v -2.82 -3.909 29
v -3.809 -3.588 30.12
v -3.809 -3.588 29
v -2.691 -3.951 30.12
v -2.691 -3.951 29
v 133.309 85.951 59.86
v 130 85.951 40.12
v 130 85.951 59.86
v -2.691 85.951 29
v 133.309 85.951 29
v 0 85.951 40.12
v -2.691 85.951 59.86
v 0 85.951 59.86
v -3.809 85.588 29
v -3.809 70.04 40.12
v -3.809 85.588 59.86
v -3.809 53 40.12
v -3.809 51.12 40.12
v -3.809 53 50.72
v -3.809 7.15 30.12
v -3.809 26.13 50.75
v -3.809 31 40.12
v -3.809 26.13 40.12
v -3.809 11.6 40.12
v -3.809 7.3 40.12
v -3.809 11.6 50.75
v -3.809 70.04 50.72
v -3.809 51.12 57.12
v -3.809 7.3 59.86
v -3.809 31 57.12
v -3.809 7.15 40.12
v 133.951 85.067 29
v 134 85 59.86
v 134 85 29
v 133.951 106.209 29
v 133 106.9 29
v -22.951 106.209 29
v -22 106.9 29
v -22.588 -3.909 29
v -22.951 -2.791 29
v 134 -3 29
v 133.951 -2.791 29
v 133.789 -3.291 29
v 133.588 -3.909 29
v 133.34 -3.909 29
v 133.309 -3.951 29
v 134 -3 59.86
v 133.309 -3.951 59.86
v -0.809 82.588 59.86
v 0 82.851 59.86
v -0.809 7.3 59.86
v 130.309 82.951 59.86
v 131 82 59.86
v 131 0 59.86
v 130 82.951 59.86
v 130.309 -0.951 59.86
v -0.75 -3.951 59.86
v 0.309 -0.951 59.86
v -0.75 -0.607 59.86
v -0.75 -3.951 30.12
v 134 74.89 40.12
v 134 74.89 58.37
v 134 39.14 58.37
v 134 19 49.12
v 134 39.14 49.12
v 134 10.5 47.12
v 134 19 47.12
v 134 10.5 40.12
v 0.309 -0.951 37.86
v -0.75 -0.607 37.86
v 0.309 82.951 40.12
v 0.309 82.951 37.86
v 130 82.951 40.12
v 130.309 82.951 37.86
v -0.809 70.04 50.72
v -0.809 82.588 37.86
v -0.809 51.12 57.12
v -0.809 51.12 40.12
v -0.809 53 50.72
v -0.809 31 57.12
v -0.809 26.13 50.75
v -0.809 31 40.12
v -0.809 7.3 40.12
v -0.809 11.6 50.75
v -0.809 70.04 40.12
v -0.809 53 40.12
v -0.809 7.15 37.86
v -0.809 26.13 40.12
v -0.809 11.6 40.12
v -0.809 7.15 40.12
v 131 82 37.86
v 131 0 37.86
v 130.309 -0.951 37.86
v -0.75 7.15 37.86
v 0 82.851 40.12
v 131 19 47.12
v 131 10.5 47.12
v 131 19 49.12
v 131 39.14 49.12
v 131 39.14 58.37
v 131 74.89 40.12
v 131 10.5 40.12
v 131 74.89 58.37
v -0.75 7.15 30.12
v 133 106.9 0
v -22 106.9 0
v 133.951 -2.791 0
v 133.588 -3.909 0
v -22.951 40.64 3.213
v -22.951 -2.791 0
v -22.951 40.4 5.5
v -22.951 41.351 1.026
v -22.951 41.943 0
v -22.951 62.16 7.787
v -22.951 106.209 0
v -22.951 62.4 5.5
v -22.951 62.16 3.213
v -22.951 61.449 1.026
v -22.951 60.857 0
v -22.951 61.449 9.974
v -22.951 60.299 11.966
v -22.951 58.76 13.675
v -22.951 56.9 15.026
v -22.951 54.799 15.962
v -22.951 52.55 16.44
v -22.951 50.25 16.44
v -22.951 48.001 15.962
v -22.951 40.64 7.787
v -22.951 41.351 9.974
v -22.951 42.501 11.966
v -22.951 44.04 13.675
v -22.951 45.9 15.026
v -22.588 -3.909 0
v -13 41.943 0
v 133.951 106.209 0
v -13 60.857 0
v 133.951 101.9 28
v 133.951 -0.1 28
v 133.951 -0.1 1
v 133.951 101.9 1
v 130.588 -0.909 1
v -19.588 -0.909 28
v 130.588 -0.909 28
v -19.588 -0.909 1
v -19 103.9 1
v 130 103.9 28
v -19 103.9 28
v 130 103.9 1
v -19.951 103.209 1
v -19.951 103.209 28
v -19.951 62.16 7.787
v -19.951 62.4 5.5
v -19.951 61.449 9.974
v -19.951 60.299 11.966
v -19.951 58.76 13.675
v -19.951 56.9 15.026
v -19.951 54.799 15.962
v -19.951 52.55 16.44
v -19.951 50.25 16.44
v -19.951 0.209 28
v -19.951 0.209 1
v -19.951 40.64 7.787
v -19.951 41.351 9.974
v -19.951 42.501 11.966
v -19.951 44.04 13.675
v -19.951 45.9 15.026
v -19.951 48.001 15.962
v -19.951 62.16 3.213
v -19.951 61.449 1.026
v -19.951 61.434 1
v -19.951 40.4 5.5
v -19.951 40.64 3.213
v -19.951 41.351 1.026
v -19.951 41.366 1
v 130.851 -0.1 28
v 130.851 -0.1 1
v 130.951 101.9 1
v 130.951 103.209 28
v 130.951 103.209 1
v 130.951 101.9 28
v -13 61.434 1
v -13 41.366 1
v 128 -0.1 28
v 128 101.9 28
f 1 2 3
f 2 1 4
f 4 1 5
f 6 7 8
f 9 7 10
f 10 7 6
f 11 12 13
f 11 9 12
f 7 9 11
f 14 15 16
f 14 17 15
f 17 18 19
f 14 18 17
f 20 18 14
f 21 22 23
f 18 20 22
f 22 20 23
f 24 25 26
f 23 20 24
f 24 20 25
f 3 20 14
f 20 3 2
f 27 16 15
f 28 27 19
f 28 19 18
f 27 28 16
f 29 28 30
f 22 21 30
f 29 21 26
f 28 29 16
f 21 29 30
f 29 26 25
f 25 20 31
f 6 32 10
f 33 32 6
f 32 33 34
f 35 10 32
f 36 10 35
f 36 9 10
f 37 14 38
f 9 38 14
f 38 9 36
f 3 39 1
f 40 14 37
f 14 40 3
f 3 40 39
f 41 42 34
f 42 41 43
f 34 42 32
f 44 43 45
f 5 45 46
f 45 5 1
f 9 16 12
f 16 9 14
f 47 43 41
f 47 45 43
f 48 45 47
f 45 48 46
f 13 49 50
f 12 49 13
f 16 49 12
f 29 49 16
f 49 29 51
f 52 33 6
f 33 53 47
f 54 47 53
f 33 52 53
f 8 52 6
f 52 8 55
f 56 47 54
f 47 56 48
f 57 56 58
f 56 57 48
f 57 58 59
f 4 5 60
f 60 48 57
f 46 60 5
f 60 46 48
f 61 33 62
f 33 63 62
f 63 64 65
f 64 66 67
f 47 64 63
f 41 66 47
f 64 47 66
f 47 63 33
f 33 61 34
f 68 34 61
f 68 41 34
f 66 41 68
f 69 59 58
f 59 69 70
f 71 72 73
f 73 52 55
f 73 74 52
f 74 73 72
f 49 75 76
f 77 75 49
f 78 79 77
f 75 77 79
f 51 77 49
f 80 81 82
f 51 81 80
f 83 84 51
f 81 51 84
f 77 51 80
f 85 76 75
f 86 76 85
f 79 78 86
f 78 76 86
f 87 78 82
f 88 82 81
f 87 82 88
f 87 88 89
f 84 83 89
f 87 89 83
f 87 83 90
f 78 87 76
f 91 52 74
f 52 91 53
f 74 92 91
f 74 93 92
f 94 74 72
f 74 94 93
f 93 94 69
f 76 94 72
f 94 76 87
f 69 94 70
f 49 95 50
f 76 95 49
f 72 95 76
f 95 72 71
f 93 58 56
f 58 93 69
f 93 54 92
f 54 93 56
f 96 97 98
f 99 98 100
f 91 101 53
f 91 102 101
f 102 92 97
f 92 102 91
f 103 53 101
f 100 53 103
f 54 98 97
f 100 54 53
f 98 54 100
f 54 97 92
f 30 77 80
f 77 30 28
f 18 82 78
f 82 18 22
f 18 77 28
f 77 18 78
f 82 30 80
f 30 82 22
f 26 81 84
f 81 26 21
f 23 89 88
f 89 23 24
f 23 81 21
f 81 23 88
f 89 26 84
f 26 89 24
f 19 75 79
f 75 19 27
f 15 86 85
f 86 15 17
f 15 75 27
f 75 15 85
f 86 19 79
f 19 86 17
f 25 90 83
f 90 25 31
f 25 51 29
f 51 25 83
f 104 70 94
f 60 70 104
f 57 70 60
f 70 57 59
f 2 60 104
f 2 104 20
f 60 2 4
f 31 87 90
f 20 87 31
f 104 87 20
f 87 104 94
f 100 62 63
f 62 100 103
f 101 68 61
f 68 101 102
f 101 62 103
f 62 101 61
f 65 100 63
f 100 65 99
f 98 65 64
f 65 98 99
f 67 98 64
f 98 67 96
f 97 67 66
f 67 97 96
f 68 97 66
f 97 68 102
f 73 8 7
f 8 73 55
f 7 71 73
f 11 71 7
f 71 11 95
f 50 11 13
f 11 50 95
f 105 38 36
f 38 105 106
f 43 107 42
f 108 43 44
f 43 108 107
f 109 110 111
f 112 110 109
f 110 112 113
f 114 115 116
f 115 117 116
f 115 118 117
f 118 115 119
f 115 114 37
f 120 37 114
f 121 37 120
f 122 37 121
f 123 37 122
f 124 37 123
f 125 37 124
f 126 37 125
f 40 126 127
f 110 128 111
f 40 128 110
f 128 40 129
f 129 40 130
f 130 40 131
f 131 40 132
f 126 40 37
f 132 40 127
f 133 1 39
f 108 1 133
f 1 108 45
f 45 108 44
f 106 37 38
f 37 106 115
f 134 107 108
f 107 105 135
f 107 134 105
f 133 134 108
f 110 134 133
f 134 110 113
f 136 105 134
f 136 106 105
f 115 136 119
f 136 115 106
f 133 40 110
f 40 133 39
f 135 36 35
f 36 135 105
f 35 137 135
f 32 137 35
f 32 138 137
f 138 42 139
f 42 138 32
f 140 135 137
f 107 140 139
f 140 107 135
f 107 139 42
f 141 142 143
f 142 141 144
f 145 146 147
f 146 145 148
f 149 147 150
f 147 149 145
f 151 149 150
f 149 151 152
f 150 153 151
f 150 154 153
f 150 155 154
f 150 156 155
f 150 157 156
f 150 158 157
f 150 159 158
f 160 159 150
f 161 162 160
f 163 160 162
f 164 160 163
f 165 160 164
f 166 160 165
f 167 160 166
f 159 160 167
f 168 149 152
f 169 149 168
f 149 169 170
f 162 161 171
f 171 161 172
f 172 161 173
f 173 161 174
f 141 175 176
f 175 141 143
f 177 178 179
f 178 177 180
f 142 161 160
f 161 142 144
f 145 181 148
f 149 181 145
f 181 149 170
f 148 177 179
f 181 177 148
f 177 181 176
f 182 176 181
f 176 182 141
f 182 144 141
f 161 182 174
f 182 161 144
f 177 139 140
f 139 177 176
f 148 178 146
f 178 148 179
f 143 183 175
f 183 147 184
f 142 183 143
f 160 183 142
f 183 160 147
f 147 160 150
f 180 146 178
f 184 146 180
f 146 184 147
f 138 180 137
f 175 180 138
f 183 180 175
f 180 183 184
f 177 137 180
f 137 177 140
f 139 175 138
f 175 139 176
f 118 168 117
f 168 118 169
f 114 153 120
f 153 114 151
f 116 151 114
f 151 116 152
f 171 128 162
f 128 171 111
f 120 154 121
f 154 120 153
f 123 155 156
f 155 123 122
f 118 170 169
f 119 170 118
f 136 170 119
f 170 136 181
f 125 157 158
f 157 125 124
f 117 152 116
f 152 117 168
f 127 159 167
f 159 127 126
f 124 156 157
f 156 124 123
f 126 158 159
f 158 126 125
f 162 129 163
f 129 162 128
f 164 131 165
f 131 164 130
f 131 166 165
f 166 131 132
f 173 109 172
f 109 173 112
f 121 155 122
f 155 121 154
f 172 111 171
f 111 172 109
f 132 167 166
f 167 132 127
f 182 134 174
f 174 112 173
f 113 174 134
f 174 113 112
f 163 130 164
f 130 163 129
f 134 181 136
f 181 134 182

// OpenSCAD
// file: ../hdd_case/case.scad
module case (width, length, wall_height, wall_thickness, x_offset, y_offset, z_offset){
    //Negative space
    top_right_point = [width + x_offset, length + y_offset, z_offset];
    top_left_point = [width + x_offset, y_offset, z_offset];
    bottom_right_point = [x_offset, length + y_offset, z_offset];
    bottom_left_point = [x_offset, y_offset, z_offset];

    //Base space
    top_right_point_base = [width + wall_thickness, length + wall_thickness, 0];
    top_left_point_base = [width + wall_thickness, -wall_thickness, 0];
    bottom_right_point_base = [-wall_thickness, length + wall_thickness, 0];
    bottom_left_point_base = [-wall_thickness, -wall_thickness, 0];
    
    //Lists for the for loops
    base_points = [top_right_point_base, top_left_point_base, bottom_right_point_base, bottom_left_point_base];
    points = [top_right_point, top_left_point, bottom_right_point, bottom_left_point];

    difference(){
        hull(){
            for (point = base_points){
                translate(point){
                    cylinder(height);
                }
            }
        }
        hull(){
            for (point = points){
                translate(point){
                    cylinder(height);
                }
            }
        }
    }
}

module roofed_case(width, length, wall_height, wall_thickness, x_offset, y_offset, z_offset, roof_thickness){
    case(width, length, wall_height, wall_thickness, x_offset, y_offset, z_offset);
    top_right_point_base = [width + wall_thickness, length + wall_thickness, wall_height];
    top_left_point_base = [width + wall_thickness, -wall_thickness, wall_height ];
    bottom_right_point_base = [-wall_thickness, length + wall_thickness, wall_height];
    bottom_left_point_base = [-wall_thickness, -wall_thickness, wall_height];
    points = [top_right_point_base, top_left_point_base, bottom_right_point_base, bottom_left_point_base];
    hull(){
           for(point = points){
               translate(point) cylinder(roof_thickness);
           }
    }
    
}

//Changeable values
width = 100;
length = 100;
wall_height = 10;
x_offset = 0;
y_offset = 0;
z_offset = 1;
wall_thickness = 3;
roof_thickness = 3;

//Non-changeable values
height = z_offset + wall_height;

//This is for making sure it renders correctly
/*
translate([0, 0, wall_height + 10]){
    case(width,
        length,
        wall_height,
        wall_thickness,
        x_offset,
        y_offset,
        z_offset);
}

roofed_case(width,
     length,
     wall_height,
     wall_thickness,
     x_offset,
     y_offset,
     z_offset);
*/
// file: case.scad
module case (width, length, wall_height, wall_thickness, x_offset, y_offset, z_offset){
    //Negative space
    top_right_point = [width + x_offset, length + y_offset, z_offset];
    top_left_point = [width + x_offset, y_offset, z_offset];
    bottom_right_point = [x_offset, length + y_offset, z_offset];
    bottom_left_point = [x_offset, y_offset, z_offset];

    //Base space
    top_right_point_base = [width + wall_thickness, length + wall_thickness, 0];
    top_left_point_base = [width + wall_thickness, -wall_thickness, 0];
    bottom_right_point_base = [-wall_thickness, length + wall_thickness, 0];
    bottom_left_point_base = [-wall_thickness, -wall_thickness, 0];
    
    //Lists for the for loops
    base_points = [top_right_point_base, top_left_point_base, bottom_right_point_base, bottom_left_point_base];
    points = [top_right_point, top_left_point, bottom_right_point, bottom_left_point];

    difference(){
        hull(){
            for (point = base_points){
                translate(point){
                    cylinder(height);
                }
            }
        }
        hull(){
            for (point = points){
                translate(point){
                    cylinder(height);
                }
            }
        }
    }
}

module roofed_case(width, length, wall_height, wall_thickness, x_offset, y_offset, z_offset, roof_thickness){
    case(width, length, wall_height, wall_thickness, x_offset, y_offset, z_offset);
    top_right_point_base = [width + wall_thickness, length + wall_thickness, wall_height];
    top_left_point_base = [width + wall_thickness, -wall_thickness, wall_height ];
    bottom_right_point_base = [-wall_thickness, length + wall_thickness, wall_height];
    bottom_left_point_base = [-wall_thickness, -wall_thickness, wall_height];
    points = [top_right_point_base, top_left_point_base, bottom_right_point_base, bottom_left_point_base];
    hull(){
           for(point = points){
               translate(point) cylinder(roof_thickness);
           }
    }
    
}

//Changeable values
width = 100;
length = 100;
wall_height = 10;
x_offset = 0;
y_offset = 0;
z_offset = 1;
wall_thickness = 3;
roof_thickness = 3;

//Non-changeable values
height = z_offset + wall_height;

//This is for making sure it renders correctly
/*
translate([0, 0, wall_height + 10]){
    case(width,
        length,
        wall_height,
        wall_thickness,
        x_offset,
        y_offset,
        z_offset);
}

roofed_case(width,
     length,
     wall_height,
     wall_thickness,
     x_offset,
     y_offset,
     z_offset);
*/
// file: ../hdd_case/3.5in_case.scad
include<case.scad>

//Changeable values
width = 103;
length = 149;
wall_height = 28;
x_offset = 0;
y_offset = 0;
z_offset = 1;
wall_thickness = 3;
roof_thickness = 2;

//Opening
disk_x = 102;
disk_y = wall_thickness + 3;
disk_z = 27;
position_disk_x = 0;
position_disk_y = -4;
position_disk_z = z_offset;

//Manual eject
heigh_eject = 10;
radius_1_eject = 22/2;
radius_2_eject = 22/2;
position_eject_x = width/2;
position_eject_y = 153;
position_eject_z = radius_1_eject/2;
rotate_eject_x = 90;
rotate_eject_y = 0;
rotate_eject_z = -0;

//Non-changeable values
height = z_offset + wall_height;

module make_35_holder(){
	difference(){
		roofed_case(width,
		     length,
		     wall_height,
		     wall_thickness,
		     x_offset,
		     y_offset,
		     z_offset);
		translate([position_disk_x, position_disk_y, position_disk_z]) {
		    color([0, 1, 0]) cube([disk_x, disk_y, disk_z]);
		}
		translate([position_eject_x, position_eject_y, position_eject_z]){
		    rotate([rotate_eject_x, rotate_eject_y, rotate_eject_z]){
			    color([0, 1, 0]) cylinder(heigh_eject, radius_1_eject, radius_2_eject);
		    }
		}
	}
}
make_35_holder();
// file: case_with_port_holes.scad
//Editiable values
include<case.scad>

//Case values
width = 130;
length = 82;
wall_height = 22;
x_offset = 0;
y_offset = 0;
z_offset = 8.86;
wall_thickness = 3;


//Offset_value
backside_x_offset = -4;
frontside_x_offset = width;
port_z_offset = z_offset + 2.26;
port_y_offset = length;

//Ethernet
ethernet_x = 20.12;
ethernet_y = 21.22;
ethernet_z = 17;
ethernet_position_x = backside_x_offset;
ethernet_position_y = 31;
ethernet_position_z = port_z_offset;

//Power
power_cable_x = 11.58;
power_cable_y = 14.53;
power_cable_z = 10.63;
power_cable_position_x = backside_x_offset;
power_cable_position_y = 11.6;
power_cable_position_z = port_z_offset;

//HDMI
hdmi_x = 11.43;
hdmi_y = 17.04;
hdmi_z = 10.6;
hdmi_position_x = backside_x_offset;
hdmi_position_y = 53;
hdmi_position_z = port_z_offset;

//SATA Main Card
sata_x = 67.5;
sata_y = 7.3;
sata_z = 58.18;
sata_position_x = backside_x_offset;
sata_position_y = 0;
sata_position_z = port_z_offset;


//Face SATA card
sata_face_x = 3.25;
sata_face_y = 15.15;
sata_face_z = 80;
sata_face_position_x = backside_x_offset;
sata_face_position_y = -8;
sata_face_position_z = port_z_offset -10;

//USB1
usb1_x = 10;
usb1_y = 18.25;
usb1_z = 18.25;
usb1_position_x = frontside_x_offset;
usb1_position_y = 56.64;
usb1_position_z = port_z_offset;

//USB2
usb2_x = 10;
usb2_y = 18.25;
usb2_z = 18.25;
usb2_position_x = frontside_x_offset;
usb2_position_y = 39.14;
usb2_position_z = port_z_offset;

//Power buttom
power_button_x = 10;
power_button_y = 16.25;
power_button_z = 9;
power_button_position_x = frontside_x_offset;
power_button_position_y = 19;
power_button_position_z = port_z_offset;

//Reset button
reset_button_x = 10;
reset_button_y = 16.25;
reset_button_z = 9;
reset_button_position_x = frontside_x_offset;
reset_button_position_y = 29;
reset_button_position_z = port_z_offset;

//Audio
audio_x = 10;
audio_y = 13;
audio_z = 7;
audio_position_x = frontside_x_offset;
audio_position_y = 10.5;
audio_position_z = port_z_offset;

//Side load
side_x = 130;
side_y = 10;
side_z = 20;
side_position_x = 0;
side_position_y = port_y_offset;
side_position_z = port_z_offset;

//The box
module make_case(){
	difference(){
		case(width,
		     length,
		     wall_height,
		     wall_thickness,
		     x_offset,
		     y_offset,
		     z_offset);
		/*translate([-4, -10, 0]){
			color([1, 0, 0]) cube([135, 100, 10]);
		}*/
		translate([ethernet_position_x, ethernet_position_y, ethernet_position_z]){
			color([0, 1, 0]) cube([ethernet_x, ethernet_x, ethernet_z]);
		}
		translate([power_cable_position_x, power_cable_position_y, power_cable_position_z]){
			color([0, 1, 0]) cube([power_cable_x, power_cable_y, power_cable_z]);
		}
		translate([hdmi_position_x, hdmi_position_y, hdmi_position_z]){
			color([0, 1, 0]) cube([hdmi_x, hdmi_y, hdmi_z]);
		}
		translate([sata_position_x, sata_position_y, sata_position_z]){
			color([0, 1, 0]) cube([sata_x, sata_y, sata_z]);
		}
		translate([sata_face_position_x, sata_face_position_y, sata_face_position_z]){
			color([0, 1, 0]) cube([sata_face_x, sata_face_y, sata_face_z]);
		}
		translate([usb1_position_x, usb1_position_y, usb1_position_z]){
			color([0, 1, 0]) cube([usb1_x, usb1_y, usb1_z]);
		}
		translate([usb2_position_x, usb2_position_y, usb2_position_z]){
			color([0, 1, 0]) cube([usb2_x, usb2_y, usb2_z]);
		}
		translate([power_button_position_x, power_button_position_y, power_button_position_z]){
			color([0, 1, 0]) cube([power_button_x, power_button_y, power_button_z]);
		}
		translate([reset_button_position_x, reset_button_position_y, reset_button_position_z]){
			color([0, 1, 0]) cube([reset_button_x, reset_button_y, reset_button_z]);
		}
		translate([audio_position_x, audio_position_y, audio_position_z]){
			color([0, 1, 0]) cube([audio_x, audio_y, audio_z]);
		}
		translate([side_position_x, side_position_y, side_position_z]){
			color([0, 1, 0]) cube([side_x, side_y, side_z]);
		}
	}
}
make_case();
// main file
use <case_with_port_holes.scad>
use <../hdd_case/3.5in_case.scad>

translate([0, 0, 29]){
    make_case();
}

translate([130, -0.1, 0]){
	rotate([0, 0, 90]){
	    make_35_holder();
    }
}
